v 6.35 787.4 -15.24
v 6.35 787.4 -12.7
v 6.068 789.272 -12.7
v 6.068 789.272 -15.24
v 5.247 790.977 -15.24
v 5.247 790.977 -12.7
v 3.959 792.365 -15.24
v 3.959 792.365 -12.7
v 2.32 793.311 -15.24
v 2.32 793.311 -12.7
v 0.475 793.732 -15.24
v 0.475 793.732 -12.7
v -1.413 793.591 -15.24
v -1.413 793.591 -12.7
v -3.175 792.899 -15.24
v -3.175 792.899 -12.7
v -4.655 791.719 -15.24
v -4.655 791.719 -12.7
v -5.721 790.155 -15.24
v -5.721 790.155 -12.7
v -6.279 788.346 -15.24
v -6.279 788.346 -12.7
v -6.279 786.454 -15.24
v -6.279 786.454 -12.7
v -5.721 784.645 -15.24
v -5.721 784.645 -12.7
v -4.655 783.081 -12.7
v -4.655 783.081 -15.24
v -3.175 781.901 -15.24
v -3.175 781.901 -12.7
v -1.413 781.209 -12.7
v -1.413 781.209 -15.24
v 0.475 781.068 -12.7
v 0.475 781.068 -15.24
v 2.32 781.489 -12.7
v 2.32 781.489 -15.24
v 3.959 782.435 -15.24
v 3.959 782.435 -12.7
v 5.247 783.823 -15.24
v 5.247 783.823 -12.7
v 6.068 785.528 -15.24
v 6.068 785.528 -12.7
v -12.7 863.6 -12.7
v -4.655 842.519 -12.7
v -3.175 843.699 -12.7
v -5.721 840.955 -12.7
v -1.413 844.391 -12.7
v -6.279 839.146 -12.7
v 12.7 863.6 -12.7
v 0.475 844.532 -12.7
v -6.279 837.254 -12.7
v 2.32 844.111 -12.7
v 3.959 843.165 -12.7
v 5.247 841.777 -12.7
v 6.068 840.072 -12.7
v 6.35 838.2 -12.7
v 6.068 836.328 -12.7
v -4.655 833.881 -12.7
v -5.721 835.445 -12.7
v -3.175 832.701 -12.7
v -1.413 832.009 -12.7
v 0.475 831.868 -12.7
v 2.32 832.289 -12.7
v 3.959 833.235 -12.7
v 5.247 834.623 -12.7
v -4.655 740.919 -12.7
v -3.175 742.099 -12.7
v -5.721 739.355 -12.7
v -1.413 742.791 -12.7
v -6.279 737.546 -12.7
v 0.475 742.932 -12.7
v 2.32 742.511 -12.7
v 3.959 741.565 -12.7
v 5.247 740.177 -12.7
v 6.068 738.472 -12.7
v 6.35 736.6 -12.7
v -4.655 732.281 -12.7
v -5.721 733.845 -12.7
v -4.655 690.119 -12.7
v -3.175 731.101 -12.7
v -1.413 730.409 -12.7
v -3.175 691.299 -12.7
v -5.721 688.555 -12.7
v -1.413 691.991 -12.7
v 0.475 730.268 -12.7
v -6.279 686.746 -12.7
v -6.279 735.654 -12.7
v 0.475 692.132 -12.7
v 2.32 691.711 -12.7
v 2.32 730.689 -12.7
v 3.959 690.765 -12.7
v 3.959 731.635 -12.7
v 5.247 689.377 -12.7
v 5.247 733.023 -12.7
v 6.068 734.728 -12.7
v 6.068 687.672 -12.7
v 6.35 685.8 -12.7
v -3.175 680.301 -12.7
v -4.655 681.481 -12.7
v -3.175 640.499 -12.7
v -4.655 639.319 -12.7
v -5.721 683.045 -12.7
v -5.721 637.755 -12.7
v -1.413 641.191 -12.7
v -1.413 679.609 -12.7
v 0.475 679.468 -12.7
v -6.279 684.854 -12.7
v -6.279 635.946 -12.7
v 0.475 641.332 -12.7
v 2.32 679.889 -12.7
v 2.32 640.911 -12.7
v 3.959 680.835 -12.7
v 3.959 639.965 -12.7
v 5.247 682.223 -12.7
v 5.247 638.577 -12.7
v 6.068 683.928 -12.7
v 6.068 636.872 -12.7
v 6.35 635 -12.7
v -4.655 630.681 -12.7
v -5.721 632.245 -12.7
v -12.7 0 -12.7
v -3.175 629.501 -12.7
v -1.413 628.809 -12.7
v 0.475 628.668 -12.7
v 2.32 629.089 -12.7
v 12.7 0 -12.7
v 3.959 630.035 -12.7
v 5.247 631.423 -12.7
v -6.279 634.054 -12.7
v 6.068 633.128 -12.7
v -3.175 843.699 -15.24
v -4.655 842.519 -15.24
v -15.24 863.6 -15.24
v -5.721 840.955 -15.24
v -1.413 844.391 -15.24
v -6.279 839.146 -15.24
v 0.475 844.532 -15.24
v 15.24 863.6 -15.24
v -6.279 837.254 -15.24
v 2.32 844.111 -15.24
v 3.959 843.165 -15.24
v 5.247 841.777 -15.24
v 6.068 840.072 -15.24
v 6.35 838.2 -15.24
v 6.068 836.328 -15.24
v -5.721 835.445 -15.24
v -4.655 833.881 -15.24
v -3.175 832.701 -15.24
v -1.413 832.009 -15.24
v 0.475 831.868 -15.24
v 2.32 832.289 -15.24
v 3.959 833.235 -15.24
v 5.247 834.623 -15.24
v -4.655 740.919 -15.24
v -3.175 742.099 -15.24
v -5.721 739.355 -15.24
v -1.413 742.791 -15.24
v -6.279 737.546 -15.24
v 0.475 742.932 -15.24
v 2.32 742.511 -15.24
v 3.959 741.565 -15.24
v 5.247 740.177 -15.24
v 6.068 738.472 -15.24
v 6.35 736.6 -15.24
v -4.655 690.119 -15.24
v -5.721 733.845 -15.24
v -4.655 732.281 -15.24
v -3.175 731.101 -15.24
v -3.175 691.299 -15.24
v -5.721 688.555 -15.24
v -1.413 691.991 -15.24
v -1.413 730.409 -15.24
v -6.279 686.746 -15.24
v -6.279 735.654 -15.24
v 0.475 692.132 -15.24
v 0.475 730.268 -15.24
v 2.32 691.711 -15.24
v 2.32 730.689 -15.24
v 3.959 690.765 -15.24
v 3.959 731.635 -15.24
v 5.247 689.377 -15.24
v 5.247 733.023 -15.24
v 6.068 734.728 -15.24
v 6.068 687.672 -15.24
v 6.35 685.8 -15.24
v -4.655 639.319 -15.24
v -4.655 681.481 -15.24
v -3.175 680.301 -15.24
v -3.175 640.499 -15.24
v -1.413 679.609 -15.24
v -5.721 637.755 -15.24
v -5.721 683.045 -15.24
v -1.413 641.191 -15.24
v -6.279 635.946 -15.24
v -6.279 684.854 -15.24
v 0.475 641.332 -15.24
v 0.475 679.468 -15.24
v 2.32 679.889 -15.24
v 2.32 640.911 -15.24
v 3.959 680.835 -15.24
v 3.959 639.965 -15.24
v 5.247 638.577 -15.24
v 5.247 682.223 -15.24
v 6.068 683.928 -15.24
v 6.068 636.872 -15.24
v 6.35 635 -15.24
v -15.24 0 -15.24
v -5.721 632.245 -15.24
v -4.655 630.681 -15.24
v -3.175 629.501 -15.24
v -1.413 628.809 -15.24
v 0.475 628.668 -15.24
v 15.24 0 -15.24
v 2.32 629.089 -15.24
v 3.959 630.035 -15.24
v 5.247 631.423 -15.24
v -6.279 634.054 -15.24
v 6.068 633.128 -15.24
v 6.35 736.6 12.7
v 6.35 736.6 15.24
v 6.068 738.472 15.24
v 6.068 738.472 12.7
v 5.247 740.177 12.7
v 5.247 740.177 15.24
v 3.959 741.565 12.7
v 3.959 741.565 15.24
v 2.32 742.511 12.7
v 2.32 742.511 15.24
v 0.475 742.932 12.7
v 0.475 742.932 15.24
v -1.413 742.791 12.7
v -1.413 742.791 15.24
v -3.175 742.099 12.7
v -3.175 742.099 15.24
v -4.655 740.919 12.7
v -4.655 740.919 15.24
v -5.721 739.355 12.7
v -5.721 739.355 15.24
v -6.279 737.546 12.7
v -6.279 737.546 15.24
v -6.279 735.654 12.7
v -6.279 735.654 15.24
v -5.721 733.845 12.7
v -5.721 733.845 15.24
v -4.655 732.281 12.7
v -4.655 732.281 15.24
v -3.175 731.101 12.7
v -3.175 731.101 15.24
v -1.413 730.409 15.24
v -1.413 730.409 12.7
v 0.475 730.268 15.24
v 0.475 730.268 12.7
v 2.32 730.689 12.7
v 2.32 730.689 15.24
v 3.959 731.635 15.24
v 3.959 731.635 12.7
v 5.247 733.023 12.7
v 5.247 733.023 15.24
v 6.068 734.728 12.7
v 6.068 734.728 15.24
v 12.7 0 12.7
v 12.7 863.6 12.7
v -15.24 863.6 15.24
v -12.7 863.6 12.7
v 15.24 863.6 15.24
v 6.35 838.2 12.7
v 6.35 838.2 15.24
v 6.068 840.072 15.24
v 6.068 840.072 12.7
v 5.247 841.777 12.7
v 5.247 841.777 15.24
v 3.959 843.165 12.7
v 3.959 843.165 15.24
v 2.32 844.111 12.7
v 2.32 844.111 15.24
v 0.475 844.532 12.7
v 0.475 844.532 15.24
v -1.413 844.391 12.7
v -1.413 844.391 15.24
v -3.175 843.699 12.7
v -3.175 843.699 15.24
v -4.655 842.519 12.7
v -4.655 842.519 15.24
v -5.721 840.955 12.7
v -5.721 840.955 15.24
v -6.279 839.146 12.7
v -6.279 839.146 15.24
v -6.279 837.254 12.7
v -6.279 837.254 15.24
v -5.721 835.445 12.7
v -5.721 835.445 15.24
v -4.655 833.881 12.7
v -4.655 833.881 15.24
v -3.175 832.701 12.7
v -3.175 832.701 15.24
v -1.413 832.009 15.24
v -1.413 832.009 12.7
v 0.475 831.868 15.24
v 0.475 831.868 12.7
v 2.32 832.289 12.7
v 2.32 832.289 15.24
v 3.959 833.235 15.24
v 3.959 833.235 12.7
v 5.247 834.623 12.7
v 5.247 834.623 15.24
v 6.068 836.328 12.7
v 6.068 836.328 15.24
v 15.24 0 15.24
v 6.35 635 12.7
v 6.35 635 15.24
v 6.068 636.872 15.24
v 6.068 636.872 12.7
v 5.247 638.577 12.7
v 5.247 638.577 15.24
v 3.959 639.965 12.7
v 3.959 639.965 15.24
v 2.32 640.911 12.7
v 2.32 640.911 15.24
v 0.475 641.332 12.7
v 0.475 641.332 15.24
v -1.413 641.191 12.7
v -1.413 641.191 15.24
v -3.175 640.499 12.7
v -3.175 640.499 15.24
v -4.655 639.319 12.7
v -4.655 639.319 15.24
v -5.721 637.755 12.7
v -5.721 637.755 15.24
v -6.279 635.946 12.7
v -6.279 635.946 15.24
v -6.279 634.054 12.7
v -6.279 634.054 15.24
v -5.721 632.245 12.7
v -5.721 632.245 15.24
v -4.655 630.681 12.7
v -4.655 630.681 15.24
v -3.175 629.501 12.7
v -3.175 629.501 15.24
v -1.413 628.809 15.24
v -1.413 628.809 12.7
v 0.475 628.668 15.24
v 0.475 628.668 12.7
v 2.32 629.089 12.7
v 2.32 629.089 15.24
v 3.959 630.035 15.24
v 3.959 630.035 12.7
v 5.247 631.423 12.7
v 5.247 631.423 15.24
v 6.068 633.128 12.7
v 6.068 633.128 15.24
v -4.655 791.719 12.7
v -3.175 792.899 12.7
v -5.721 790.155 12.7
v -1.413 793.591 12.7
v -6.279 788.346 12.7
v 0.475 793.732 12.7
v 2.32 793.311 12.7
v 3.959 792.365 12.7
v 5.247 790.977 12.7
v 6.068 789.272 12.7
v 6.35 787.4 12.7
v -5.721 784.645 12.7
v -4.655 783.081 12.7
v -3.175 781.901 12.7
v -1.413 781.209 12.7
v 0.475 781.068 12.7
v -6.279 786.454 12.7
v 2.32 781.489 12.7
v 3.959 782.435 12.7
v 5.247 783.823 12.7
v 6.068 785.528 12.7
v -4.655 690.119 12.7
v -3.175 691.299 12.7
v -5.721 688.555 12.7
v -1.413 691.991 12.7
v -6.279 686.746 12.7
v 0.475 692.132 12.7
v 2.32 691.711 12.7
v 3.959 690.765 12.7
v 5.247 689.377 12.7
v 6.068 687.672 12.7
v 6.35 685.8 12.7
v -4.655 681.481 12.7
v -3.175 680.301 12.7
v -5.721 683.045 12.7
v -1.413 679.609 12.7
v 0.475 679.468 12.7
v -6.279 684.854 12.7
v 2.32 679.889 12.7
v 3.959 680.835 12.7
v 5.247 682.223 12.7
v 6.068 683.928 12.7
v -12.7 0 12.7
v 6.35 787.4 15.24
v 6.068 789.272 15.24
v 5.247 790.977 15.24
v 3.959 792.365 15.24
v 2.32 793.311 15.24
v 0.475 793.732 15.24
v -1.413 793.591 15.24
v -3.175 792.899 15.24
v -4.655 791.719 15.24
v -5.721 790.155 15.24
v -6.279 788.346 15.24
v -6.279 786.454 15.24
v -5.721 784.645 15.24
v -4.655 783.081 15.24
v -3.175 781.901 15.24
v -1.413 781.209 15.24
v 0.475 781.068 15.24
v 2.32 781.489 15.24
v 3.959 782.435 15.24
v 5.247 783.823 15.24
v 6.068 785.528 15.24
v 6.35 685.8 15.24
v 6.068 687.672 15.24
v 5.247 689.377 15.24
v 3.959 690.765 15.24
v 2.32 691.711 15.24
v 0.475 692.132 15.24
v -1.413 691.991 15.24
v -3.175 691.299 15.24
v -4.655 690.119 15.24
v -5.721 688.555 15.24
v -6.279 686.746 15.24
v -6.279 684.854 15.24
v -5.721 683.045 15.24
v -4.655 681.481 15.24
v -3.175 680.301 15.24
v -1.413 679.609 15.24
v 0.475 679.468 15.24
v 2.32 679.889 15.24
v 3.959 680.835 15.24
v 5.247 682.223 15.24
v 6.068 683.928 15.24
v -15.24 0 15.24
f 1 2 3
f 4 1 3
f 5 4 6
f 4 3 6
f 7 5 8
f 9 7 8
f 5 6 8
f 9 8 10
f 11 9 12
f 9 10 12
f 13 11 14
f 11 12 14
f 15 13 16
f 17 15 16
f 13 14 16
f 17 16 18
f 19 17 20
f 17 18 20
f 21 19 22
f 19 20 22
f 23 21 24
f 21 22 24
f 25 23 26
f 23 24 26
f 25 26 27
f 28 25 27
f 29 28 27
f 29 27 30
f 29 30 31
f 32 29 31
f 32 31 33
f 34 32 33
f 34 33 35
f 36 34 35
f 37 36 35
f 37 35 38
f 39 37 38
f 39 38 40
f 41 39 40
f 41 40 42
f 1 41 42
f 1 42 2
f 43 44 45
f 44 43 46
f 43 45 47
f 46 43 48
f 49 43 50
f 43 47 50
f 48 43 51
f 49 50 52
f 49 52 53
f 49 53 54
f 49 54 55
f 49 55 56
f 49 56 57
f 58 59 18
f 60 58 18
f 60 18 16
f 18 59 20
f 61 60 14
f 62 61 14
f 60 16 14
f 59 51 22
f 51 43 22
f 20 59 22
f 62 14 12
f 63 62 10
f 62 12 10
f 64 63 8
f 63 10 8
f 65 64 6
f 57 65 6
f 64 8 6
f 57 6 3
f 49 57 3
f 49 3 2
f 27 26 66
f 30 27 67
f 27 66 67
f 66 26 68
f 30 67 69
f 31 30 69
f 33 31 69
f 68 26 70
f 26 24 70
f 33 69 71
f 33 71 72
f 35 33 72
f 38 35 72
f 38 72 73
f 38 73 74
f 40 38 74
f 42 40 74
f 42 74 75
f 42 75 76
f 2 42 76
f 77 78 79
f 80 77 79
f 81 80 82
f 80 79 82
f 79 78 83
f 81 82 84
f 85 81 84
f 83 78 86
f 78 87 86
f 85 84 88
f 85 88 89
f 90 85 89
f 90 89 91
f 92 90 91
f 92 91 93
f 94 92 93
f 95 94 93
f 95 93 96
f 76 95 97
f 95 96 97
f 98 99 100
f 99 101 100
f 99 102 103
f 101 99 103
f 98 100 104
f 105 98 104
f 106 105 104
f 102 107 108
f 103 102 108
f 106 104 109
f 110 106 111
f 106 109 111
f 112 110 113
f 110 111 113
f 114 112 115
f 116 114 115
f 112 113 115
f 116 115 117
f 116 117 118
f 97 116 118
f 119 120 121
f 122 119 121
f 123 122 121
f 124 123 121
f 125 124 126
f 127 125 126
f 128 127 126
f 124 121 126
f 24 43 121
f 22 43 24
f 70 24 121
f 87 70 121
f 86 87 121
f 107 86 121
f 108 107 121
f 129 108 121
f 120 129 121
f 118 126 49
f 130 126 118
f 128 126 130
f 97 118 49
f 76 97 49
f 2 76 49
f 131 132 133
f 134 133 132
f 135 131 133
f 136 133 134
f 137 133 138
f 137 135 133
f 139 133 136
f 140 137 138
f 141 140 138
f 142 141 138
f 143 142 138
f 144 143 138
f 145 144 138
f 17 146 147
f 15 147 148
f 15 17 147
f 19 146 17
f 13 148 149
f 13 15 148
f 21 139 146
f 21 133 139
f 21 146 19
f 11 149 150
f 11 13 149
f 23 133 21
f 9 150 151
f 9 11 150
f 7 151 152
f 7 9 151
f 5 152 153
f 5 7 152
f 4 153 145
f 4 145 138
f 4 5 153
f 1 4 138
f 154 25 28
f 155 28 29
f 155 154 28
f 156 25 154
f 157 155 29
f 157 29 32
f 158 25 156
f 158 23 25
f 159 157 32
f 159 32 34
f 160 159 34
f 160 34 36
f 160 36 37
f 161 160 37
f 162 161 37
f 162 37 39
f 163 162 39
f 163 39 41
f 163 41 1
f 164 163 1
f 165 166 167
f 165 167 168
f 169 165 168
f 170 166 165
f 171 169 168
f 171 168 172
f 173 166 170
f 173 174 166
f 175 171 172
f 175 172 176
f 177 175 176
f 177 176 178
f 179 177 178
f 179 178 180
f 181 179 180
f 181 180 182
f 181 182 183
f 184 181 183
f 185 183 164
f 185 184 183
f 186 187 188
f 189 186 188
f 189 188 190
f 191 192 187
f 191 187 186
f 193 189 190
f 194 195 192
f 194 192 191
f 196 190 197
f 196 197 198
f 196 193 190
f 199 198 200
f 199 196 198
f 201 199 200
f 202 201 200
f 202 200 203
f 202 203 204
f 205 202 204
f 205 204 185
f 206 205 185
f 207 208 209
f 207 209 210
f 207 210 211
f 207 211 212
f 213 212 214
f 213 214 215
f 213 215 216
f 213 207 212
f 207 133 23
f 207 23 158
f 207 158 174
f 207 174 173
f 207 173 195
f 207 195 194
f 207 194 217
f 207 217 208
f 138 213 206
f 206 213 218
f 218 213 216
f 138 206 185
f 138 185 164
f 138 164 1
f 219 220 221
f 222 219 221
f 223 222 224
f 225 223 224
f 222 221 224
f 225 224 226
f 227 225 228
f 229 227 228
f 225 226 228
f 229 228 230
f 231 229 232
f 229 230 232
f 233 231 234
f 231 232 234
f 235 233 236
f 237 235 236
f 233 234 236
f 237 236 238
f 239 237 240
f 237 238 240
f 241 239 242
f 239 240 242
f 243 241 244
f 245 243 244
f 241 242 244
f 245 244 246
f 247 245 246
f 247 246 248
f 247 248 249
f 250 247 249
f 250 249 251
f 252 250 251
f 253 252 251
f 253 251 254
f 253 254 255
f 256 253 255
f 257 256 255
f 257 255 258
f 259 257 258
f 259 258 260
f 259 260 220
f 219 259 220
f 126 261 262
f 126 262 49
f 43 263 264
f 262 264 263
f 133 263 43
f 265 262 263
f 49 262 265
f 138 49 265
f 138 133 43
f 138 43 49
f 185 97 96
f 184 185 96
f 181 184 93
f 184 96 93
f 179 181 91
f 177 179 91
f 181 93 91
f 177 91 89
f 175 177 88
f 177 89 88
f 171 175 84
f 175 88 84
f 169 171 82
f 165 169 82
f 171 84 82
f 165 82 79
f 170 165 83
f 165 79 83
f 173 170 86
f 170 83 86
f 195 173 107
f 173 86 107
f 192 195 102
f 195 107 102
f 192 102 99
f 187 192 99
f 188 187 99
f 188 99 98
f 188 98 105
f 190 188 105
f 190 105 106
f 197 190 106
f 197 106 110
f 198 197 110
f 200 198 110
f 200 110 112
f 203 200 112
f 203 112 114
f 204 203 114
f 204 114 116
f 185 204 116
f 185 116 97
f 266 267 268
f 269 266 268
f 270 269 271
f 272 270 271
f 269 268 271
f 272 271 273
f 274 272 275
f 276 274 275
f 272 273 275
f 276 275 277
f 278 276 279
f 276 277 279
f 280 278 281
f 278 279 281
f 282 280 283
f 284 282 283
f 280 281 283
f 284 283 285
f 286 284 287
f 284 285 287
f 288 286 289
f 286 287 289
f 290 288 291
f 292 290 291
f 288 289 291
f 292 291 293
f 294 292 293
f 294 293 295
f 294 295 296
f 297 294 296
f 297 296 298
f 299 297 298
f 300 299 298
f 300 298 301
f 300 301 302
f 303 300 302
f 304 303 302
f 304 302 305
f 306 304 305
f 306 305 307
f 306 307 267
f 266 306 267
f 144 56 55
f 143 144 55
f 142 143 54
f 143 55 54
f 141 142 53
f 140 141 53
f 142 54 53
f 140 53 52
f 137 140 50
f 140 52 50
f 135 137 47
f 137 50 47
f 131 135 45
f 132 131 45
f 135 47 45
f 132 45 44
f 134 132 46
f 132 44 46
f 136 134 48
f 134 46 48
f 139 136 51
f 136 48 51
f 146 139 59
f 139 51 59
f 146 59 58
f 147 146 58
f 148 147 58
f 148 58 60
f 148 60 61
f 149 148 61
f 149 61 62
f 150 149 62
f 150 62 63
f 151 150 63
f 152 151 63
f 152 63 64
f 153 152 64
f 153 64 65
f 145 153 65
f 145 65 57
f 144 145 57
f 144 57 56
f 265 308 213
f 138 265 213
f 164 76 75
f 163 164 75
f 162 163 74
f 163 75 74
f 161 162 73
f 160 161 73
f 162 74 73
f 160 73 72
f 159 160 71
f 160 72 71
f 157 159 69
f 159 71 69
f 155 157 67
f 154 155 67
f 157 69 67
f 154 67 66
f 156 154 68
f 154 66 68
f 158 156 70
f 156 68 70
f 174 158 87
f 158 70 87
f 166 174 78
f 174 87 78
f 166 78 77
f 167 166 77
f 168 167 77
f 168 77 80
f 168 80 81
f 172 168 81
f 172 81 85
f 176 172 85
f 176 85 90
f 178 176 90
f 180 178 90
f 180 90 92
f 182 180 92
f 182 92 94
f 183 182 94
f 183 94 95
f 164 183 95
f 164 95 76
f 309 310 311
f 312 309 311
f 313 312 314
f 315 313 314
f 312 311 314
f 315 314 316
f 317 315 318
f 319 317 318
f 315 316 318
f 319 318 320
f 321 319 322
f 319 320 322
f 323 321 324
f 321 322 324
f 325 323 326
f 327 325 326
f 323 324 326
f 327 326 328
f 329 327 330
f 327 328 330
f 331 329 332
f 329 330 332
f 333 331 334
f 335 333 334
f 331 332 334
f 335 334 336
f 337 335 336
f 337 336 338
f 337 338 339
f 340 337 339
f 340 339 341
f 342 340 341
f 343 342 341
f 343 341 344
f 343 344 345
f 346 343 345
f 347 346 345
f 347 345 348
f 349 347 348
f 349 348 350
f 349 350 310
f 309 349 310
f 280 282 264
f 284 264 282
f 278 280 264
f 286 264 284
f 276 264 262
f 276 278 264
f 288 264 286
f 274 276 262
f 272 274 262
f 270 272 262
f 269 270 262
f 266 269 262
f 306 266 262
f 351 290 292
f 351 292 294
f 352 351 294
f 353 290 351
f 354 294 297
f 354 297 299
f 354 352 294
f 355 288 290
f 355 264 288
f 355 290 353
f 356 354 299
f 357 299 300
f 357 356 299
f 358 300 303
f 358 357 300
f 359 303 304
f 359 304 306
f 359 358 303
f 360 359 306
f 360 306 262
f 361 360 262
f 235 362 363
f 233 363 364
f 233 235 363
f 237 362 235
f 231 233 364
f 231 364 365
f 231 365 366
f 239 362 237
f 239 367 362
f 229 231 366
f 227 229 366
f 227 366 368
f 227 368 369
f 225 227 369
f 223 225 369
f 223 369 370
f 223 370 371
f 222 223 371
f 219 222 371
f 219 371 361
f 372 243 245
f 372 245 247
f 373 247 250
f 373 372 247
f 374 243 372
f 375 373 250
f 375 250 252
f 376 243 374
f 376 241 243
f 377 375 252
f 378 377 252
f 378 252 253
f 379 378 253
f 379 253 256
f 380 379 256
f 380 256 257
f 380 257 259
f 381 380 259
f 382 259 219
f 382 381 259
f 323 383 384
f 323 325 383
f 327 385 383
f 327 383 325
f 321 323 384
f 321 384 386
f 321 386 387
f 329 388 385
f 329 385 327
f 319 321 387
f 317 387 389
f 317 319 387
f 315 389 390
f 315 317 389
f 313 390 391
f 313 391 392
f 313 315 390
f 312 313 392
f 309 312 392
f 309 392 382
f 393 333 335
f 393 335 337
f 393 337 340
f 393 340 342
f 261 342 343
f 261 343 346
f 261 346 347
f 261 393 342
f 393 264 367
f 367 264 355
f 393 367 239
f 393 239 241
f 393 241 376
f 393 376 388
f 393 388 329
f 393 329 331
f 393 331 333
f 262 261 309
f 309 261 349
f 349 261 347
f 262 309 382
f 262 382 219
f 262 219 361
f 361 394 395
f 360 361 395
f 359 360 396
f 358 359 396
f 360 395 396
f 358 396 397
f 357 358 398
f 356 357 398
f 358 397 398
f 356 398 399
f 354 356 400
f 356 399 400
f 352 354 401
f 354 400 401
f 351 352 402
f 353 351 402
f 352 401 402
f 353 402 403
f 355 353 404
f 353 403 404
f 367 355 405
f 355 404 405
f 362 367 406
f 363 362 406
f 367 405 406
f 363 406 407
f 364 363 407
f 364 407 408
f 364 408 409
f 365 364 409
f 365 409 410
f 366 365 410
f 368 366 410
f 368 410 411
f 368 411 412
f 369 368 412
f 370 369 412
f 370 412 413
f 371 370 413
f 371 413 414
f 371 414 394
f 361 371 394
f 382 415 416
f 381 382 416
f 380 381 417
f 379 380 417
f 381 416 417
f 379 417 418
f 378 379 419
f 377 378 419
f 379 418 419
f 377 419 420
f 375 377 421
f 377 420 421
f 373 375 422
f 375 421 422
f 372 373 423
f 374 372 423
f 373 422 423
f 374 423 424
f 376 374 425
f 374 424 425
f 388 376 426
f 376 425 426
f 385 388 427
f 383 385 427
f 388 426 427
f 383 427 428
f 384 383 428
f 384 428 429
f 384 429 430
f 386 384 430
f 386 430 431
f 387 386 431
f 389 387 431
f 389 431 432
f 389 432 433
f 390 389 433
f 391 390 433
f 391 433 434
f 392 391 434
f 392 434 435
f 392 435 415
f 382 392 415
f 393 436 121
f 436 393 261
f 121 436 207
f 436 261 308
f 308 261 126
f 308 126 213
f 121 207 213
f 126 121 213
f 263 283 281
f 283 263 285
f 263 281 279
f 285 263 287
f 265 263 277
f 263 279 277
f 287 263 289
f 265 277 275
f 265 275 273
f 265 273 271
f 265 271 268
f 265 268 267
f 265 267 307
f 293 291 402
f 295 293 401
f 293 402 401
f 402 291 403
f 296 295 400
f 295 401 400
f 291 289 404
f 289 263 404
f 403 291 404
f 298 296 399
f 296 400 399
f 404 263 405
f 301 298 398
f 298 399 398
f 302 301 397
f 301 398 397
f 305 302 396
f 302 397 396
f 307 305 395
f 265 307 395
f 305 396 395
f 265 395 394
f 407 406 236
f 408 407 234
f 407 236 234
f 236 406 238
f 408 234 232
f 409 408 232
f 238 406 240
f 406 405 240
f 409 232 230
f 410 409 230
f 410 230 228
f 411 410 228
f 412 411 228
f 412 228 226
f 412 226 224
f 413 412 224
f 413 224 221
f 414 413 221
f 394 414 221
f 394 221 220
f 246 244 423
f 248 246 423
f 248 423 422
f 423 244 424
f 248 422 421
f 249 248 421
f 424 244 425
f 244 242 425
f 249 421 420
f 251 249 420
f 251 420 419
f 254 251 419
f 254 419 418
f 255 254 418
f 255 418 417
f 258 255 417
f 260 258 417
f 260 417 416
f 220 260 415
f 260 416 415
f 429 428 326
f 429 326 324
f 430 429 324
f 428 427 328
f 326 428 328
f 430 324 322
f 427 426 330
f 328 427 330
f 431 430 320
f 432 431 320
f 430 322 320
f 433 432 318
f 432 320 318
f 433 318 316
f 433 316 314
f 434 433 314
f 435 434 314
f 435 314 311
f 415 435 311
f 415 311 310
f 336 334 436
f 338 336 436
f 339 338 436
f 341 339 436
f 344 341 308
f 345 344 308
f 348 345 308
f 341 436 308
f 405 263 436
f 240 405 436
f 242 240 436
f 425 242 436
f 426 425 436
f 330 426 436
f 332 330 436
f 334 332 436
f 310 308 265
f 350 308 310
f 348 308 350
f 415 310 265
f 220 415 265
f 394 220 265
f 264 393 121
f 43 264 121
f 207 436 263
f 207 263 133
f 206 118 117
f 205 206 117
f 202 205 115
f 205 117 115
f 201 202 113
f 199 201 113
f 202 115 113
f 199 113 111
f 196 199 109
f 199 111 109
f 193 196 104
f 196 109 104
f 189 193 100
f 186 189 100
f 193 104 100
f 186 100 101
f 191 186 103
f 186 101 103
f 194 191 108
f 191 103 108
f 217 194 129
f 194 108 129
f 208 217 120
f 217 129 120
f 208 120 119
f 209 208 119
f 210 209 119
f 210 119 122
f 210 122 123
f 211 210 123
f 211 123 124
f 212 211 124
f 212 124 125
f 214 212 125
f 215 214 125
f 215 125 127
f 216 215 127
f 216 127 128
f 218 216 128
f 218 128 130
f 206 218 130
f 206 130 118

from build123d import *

# Parameters (mm, degrees)
SKETCH1_W           = 30.48
SKETCH1_H           = 30.48
SKETCH1_W_2         = 25.4
SKETCH1_H_2         = 25.4
EXTRUDE_THIN1_DEPTH = 863.6
SKETCH2_R           = 6.35
CUT_EXTRUDE1_DEPTH  = 865.272091416
LPATTERN1_COUNT     = 5
LPATTERN1_PITCH     = 50.8


with BuildPart() as part:
    # Sketch1 → Extrude-Thin1 (new body)
    with BuildSketch(Plane(origin=(0, 0, 0), x_dir=(1, 0, 0), z_dir=(0, 1, 0))):
        Rectangle(SKETCH1_W, SKETCH1_H)
        Rectangle(SKETCH1_W_2, SKETCH1_H_2, mode=Mode.SUBTRACT)
    extrude(amount=EXTRUDE_THIN1_DEPTH)

    # Sketch2 → Cut-Extrude1 (cut, through all)
    with BuildSketch(Plane.XY.offset(15.24)):
        with Locations((0, 838.2)):
            Circle(SKETCH2_R)
    cut_extrude1 = extrude(amount=-CUT_EXTRUDE1_DEPTH, mode=Mode.SUBTRACT)

    # LPattern1: Cut-Extrude1 ×5
    with Locations(*[(0, -i * LPATTERN1_PITCH, 0) for i in range(1, LPATTERN1_COUNT)]):
        add(cut_extrude1, mode=Mode.SUBTRACT)


solid = part.part
